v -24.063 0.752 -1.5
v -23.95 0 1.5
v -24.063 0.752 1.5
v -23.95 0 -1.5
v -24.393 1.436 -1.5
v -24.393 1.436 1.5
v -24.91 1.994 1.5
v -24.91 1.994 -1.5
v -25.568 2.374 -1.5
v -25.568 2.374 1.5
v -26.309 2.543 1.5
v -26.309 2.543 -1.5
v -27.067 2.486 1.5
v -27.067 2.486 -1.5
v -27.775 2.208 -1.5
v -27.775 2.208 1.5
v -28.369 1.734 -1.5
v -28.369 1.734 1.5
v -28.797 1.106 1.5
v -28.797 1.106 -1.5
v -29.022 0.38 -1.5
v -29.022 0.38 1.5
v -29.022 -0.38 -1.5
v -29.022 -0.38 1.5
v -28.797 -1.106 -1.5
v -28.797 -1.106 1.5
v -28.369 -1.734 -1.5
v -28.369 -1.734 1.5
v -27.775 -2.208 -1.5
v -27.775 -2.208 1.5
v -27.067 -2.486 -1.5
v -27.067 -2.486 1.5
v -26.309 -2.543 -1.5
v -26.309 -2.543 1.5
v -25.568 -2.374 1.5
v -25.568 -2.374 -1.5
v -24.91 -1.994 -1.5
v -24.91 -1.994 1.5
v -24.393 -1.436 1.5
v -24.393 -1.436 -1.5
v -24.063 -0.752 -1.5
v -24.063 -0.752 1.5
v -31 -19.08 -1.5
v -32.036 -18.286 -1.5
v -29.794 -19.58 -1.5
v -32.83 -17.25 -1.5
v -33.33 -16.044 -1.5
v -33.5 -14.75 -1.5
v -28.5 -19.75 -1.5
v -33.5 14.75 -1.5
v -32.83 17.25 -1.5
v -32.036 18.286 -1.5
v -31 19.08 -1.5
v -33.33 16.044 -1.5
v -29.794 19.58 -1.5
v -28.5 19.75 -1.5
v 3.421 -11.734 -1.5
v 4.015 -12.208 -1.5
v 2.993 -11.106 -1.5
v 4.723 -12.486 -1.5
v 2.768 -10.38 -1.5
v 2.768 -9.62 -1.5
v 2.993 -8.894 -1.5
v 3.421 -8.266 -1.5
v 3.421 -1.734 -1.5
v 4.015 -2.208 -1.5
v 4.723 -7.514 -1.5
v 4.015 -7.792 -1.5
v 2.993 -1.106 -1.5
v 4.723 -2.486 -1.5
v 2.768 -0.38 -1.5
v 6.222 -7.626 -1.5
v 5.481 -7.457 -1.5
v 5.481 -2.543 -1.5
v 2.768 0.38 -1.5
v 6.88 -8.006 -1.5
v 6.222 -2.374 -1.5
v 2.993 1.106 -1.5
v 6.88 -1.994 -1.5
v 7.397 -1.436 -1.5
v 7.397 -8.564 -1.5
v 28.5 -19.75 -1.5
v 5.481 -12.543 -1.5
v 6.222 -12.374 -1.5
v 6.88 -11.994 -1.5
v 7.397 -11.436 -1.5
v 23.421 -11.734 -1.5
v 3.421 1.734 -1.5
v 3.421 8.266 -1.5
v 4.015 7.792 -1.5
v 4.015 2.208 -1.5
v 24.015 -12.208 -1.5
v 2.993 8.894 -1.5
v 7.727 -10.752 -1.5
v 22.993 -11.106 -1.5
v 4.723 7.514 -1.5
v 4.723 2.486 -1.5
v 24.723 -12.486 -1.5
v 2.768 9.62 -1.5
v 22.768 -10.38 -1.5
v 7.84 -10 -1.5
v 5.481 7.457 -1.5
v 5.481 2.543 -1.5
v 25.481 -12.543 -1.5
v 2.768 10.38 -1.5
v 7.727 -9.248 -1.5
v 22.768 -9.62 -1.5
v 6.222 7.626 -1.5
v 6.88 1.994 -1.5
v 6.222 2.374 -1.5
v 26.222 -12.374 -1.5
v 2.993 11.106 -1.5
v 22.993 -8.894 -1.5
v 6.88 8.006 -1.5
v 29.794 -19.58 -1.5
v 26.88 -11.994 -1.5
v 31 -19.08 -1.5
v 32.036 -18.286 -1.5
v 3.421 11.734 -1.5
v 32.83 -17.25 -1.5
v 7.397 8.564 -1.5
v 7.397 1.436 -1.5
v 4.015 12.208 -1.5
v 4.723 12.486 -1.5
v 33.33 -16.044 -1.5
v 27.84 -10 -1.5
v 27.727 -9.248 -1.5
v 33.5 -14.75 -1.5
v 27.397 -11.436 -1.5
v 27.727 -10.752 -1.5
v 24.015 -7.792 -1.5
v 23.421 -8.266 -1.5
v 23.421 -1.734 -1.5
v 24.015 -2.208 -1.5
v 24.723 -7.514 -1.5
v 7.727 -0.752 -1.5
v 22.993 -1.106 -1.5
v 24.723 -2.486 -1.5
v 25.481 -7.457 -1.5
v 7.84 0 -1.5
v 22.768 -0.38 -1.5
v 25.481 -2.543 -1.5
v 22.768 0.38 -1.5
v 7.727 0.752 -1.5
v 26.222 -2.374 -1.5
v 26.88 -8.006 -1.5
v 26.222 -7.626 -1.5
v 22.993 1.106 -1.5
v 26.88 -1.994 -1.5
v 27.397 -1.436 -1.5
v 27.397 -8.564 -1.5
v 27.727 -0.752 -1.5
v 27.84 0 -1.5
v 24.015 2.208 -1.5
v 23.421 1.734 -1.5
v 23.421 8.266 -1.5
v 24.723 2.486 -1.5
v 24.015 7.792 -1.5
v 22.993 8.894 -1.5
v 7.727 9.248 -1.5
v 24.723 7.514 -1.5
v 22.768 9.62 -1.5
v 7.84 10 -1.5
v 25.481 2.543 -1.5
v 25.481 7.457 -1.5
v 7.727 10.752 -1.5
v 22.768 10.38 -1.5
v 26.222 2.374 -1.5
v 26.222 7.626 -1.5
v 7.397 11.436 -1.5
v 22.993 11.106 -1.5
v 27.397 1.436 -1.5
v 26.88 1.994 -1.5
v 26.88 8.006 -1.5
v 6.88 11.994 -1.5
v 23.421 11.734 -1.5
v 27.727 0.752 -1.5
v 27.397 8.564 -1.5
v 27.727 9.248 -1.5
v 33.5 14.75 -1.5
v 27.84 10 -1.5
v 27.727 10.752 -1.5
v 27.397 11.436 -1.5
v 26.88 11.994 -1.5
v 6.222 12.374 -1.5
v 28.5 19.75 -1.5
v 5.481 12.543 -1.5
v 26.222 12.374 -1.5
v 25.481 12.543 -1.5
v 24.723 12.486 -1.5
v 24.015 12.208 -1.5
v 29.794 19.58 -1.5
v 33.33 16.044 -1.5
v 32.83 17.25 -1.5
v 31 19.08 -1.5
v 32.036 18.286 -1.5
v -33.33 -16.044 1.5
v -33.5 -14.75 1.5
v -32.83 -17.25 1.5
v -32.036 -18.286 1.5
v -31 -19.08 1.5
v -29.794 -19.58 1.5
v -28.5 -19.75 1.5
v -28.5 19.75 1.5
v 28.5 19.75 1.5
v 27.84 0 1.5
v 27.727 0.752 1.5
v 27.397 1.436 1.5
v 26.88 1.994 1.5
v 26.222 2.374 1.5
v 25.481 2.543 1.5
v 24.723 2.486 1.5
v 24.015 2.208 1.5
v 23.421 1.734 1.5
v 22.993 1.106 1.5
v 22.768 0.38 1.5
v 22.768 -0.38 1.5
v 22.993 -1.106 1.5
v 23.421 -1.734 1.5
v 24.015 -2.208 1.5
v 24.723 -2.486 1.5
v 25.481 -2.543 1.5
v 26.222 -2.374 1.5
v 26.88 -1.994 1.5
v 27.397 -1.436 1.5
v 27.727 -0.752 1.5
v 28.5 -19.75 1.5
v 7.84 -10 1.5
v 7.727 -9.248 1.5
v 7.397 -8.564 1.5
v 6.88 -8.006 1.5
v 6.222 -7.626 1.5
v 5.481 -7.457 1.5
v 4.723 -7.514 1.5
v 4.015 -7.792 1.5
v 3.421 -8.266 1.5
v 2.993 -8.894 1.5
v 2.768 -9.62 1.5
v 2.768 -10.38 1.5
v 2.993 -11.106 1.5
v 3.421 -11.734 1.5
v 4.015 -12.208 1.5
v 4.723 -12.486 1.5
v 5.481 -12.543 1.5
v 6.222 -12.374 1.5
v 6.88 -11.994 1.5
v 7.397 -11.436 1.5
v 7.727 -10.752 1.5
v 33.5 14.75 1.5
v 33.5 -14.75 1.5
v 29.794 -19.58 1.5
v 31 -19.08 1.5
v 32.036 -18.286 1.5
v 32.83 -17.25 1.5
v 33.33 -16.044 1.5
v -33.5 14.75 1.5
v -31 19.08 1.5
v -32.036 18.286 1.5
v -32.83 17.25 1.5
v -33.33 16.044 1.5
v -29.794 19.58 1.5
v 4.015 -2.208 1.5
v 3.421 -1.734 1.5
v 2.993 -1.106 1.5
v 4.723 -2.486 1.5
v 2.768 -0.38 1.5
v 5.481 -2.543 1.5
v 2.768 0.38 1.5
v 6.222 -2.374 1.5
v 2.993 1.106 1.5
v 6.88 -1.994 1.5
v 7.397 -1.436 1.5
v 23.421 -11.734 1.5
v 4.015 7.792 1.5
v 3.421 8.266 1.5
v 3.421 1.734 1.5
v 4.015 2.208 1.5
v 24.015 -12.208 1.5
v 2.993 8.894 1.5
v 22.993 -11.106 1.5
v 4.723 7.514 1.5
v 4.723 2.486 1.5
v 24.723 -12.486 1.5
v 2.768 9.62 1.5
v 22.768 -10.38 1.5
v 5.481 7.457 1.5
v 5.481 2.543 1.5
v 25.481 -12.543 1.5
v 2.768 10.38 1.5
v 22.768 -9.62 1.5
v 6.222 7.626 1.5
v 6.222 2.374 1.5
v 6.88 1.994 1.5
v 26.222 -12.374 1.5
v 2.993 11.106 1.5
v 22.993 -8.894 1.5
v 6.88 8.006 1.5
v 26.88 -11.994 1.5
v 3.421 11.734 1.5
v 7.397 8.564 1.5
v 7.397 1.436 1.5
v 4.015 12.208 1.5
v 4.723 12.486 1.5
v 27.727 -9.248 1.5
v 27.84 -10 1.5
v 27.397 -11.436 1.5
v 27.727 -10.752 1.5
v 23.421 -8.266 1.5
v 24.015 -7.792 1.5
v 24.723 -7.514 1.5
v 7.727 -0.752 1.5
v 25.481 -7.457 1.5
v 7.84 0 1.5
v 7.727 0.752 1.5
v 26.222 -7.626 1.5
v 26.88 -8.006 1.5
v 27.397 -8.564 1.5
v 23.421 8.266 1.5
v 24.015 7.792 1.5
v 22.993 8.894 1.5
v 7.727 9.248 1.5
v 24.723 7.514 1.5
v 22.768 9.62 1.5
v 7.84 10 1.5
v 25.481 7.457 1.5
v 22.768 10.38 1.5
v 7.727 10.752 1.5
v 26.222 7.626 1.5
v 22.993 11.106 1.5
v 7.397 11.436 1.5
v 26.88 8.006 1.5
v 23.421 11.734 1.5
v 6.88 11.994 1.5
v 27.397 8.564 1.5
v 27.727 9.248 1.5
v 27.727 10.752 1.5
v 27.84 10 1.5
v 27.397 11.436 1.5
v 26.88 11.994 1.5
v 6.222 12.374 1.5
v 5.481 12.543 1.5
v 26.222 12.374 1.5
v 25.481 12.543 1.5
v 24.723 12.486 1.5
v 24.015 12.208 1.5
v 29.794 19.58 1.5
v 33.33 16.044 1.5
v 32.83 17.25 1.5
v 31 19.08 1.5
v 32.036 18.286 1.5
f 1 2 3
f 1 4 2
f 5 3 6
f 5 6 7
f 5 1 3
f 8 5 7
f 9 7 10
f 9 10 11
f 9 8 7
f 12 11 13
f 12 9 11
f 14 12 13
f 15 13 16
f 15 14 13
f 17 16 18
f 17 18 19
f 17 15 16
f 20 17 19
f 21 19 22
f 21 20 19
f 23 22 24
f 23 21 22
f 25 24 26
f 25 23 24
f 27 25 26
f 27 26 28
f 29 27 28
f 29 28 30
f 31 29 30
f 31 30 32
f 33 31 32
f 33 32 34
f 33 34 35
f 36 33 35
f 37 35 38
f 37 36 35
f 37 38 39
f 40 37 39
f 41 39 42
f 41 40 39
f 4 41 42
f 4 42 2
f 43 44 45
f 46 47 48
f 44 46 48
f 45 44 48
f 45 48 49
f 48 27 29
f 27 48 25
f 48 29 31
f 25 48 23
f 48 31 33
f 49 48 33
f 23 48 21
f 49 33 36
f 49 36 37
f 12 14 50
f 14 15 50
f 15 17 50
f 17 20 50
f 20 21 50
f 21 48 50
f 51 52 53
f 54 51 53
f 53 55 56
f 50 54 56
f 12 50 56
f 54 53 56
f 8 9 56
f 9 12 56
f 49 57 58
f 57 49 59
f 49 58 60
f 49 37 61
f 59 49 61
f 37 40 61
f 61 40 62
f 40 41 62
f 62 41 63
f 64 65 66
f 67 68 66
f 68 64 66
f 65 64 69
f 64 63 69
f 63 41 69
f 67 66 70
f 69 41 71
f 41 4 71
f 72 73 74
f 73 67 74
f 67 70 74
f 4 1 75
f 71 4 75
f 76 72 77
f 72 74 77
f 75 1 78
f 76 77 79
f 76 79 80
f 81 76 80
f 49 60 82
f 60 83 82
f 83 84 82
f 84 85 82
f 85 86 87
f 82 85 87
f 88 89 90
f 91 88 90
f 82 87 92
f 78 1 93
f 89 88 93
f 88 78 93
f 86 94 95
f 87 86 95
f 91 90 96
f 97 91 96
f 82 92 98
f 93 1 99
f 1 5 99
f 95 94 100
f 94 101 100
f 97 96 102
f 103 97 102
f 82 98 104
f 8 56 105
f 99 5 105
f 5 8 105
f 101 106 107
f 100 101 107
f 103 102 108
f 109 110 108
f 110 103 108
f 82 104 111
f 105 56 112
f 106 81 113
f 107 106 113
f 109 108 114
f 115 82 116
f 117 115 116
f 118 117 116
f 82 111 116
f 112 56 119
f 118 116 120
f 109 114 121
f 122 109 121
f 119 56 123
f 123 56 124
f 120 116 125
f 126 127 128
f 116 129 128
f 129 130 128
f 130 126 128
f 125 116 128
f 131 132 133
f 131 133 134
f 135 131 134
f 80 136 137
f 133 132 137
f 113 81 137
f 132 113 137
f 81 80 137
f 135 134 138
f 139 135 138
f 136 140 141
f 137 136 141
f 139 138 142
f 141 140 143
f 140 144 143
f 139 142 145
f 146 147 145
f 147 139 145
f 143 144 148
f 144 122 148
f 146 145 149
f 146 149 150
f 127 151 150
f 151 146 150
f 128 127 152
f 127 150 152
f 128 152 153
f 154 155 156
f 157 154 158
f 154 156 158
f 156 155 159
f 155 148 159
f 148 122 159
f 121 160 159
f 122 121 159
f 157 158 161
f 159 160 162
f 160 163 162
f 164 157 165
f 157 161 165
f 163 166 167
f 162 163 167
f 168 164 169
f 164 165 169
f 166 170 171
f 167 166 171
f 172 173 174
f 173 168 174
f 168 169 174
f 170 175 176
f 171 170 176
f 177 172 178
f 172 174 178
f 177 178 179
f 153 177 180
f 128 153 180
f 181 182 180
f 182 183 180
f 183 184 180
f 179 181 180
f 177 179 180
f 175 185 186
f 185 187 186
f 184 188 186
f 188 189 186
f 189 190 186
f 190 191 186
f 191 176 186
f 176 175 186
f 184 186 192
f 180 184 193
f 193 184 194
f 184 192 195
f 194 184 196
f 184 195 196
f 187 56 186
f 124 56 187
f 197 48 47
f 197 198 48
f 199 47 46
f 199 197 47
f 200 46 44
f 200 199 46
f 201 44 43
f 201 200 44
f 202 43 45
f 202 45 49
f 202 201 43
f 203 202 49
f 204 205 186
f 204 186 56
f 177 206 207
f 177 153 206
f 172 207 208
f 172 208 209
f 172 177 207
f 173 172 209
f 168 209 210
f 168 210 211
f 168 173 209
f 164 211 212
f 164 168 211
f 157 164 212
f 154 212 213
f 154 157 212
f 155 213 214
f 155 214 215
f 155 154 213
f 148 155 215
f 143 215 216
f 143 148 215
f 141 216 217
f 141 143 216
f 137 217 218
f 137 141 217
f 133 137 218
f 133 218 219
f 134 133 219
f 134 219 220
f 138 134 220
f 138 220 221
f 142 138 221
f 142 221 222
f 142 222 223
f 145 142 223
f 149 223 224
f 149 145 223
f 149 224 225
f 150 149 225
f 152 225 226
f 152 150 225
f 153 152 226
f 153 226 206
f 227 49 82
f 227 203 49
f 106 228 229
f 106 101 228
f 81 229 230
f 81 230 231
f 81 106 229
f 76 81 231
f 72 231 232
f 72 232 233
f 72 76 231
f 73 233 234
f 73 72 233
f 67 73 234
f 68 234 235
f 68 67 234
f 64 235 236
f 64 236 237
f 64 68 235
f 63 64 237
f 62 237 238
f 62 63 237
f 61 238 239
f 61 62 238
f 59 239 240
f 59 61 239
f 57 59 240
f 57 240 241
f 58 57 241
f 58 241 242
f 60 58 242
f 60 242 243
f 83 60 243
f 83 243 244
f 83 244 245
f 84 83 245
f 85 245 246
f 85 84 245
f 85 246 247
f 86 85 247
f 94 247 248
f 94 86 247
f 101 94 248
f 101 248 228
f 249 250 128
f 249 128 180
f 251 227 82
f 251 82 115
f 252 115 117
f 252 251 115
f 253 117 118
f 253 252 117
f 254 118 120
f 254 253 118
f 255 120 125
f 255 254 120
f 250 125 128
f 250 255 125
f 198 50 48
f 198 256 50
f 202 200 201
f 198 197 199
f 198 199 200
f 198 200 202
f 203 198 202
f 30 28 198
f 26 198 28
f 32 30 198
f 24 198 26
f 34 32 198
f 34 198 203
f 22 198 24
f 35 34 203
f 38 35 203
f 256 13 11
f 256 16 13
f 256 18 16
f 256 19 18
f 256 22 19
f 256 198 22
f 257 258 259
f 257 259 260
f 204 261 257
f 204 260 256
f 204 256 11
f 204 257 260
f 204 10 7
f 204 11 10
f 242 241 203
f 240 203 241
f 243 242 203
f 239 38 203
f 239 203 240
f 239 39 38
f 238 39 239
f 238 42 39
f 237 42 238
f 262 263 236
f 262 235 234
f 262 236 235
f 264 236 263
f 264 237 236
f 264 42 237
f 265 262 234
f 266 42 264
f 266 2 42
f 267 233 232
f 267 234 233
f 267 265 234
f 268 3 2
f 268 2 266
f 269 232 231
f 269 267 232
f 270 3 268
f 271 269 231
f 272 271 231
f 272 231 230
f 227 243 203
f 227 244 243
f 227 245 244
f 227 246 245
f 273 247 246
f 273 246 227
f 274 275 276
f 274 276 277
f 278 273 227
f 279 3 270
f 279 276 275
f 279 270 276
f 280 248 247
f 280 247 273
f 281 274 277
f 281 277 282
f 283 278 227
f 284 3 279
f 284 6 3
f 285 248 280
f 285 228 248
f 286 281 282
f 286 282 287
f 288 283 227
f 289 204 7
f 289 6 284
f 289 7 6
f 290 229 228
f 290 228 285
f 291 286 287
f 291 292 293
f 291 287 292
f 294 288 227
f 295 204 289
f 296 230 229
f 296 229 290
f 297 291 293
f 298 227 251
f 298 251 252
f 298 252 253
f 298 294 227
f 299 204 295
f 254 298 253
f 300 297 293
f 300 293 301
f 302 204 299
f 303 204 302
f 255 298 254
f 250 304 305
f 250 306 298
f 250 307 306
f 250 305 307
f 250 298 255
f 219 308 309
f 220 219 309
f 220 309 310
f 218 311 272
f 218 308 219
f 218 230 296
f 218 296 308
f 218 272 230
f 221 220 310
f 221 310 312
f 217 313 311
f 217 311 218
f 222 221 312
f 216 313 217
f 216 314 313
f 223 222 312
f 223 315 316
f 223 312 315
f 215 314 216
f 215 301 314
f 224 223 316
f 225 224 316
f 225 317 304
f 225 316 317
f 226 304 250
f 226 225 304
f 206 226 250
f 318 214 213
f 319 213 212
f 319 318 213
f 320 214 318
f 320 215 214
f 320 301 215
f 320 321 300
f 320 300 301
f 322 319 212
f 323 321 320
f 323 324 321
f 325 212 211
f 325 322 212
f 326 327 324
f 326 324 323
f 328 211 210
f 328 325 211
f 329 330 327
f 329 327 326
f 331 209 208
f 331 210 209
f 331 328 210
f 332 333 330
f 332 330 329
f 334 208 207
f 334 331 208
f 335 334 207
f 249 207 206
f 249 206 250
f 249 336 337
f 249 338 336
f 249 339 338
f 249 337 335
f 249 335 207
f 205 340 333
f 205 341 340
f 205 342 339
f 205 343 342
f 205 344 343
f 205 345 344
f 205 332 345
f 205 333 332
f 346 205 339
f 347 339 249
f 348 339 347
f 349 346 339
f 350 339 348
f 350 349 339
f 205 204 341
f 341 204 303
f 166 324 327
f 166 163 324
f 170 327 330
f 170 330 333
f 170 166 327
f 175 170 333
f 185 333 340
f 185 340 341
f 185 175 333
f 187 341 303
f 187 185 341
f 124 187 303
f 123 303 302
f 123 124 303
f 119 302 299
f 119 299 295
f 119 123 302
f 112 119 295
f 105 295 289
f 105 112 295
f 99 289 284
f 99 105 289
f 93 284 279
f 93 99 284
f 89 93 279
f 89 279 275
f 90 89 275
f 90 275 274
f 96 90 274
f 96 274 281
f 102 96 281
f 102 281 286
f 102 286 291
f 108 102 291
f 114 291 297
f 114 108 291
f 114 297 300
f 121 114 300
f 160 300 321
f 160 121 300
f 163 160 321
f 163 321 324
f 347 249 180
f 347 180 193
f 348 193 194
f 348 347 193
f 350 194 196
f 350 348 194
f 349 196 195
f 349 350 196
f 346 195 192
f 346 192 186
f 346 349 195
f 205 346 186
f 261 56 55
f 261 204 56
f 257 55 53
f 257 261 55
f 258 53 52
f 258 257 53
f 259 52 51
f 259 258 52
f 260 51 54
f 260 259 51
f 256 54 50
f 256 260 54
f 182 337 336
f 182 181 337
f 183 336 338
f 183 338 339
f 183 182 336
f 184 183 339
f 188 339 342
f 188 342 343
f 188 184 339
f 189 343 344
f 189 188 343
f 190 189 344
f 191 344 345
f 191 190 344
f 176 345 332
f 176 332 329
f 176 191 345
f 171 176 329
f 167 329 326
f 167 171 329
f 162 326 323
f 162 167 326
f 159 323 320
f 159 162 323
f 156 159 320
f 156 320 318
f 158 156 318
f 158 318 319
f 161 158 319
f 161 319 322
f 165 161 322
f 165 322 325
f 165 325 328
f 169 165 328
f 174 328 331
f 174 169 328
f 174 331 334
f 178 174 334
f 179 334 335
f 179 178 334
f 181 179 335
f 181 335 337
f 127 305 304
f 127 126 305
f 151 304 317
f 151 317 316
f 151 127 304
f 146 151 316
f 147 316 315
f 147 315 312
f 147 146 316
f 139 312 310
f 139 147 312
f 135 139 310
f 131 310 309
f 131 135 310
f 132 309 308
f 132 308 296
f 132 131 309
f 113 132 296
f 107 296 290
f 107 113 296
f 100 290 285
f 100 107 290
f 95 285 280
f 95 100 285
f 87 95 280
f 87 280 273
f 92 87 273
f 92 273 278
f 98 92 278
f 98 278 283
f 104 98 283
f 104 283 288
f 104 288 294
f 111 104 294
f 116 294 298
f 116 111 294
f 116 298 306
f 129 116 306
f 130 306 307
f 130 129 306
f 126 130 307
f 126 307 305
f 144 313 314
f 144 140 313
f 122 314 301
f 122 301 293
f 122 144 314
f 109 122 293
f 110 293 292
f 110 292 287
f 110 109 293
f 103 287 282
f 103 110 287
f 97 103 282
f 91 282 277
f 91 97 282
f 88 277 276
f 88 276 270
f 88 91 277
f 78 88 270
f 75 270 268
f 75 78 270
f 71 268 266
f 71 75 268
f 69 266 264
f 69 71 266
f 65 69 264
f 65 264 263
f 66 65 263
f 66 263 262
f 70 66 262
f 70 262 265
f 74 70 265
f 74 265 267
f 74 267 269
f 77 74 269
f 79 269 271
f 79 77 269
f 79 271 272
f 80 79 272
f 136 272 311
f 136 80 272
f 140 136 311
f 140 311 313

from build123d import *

# Parameters (mm, degrees)
SKETCH1_R           = 2.55
BOSS_EXTRUDE1_DEPTH = 1.5


with BuildPart() as part:
    # Sketch1 → Boss-Extrude1 (new body, symmetric)
    with BuildSketch(Plane.XY):
        with BuildLine():
            Line((-28.5, -19.75), (28.5, -19.75))
            ThreePointArc((28.5, -19.75), (32.035533906, -18.285533906), (33.5, -14.75))
            Line((33.5, -14.75), (33.5, 14.75))
            ThreePointArc((33.5, 14.75), (32.035533906, 18.285533906), (28.5, 19.75))
            Line((28.5, 19.75), (-28.5, 19.75))
            ThreePointArc((-28.5, 19.75), (-32.035533906, 18.285533906), (-33.5, 14.75))
            Line((-33.5, 14.75), (-33.5, -14.75))
            ThreePointArc((-33.5, -14.75), (-32.035533906, -18.285533906), (-28.5, -19.75))
        make_face()
        with Locations((5.29, 10)):
            Circle(SKETCH1_R, mode=Mode.SUBTRACT)
        with Locations((25.29, 10)):
            Circle(SKETCH1_R, mode=Mode.SUBTRACT)
        with Locations((5.29, 0)):
            Circle(SKETCH1_R, mode=Mode.SUBTRACT)
        with Locations((25.29, 0)):
            Circle(SKETCH1_R, mode=Mode.SUBTRACT)
        with Locations((5.29, -10)):
            Circle(SKETCH1_R, mode=Mode.SUBTRACT)
        with Locations((25.29, -10)):
            Circle(SKETCH1_R, mode=Mode.SUBTRACT)
        with Locations((-26.5, 0)):
            Circle(SKETCH1_R, mode=Mode.SUBTRACT)
    extrude(amount=BOSS_EXTRUDE1_DEPTH, both=True)


solid = part.part
